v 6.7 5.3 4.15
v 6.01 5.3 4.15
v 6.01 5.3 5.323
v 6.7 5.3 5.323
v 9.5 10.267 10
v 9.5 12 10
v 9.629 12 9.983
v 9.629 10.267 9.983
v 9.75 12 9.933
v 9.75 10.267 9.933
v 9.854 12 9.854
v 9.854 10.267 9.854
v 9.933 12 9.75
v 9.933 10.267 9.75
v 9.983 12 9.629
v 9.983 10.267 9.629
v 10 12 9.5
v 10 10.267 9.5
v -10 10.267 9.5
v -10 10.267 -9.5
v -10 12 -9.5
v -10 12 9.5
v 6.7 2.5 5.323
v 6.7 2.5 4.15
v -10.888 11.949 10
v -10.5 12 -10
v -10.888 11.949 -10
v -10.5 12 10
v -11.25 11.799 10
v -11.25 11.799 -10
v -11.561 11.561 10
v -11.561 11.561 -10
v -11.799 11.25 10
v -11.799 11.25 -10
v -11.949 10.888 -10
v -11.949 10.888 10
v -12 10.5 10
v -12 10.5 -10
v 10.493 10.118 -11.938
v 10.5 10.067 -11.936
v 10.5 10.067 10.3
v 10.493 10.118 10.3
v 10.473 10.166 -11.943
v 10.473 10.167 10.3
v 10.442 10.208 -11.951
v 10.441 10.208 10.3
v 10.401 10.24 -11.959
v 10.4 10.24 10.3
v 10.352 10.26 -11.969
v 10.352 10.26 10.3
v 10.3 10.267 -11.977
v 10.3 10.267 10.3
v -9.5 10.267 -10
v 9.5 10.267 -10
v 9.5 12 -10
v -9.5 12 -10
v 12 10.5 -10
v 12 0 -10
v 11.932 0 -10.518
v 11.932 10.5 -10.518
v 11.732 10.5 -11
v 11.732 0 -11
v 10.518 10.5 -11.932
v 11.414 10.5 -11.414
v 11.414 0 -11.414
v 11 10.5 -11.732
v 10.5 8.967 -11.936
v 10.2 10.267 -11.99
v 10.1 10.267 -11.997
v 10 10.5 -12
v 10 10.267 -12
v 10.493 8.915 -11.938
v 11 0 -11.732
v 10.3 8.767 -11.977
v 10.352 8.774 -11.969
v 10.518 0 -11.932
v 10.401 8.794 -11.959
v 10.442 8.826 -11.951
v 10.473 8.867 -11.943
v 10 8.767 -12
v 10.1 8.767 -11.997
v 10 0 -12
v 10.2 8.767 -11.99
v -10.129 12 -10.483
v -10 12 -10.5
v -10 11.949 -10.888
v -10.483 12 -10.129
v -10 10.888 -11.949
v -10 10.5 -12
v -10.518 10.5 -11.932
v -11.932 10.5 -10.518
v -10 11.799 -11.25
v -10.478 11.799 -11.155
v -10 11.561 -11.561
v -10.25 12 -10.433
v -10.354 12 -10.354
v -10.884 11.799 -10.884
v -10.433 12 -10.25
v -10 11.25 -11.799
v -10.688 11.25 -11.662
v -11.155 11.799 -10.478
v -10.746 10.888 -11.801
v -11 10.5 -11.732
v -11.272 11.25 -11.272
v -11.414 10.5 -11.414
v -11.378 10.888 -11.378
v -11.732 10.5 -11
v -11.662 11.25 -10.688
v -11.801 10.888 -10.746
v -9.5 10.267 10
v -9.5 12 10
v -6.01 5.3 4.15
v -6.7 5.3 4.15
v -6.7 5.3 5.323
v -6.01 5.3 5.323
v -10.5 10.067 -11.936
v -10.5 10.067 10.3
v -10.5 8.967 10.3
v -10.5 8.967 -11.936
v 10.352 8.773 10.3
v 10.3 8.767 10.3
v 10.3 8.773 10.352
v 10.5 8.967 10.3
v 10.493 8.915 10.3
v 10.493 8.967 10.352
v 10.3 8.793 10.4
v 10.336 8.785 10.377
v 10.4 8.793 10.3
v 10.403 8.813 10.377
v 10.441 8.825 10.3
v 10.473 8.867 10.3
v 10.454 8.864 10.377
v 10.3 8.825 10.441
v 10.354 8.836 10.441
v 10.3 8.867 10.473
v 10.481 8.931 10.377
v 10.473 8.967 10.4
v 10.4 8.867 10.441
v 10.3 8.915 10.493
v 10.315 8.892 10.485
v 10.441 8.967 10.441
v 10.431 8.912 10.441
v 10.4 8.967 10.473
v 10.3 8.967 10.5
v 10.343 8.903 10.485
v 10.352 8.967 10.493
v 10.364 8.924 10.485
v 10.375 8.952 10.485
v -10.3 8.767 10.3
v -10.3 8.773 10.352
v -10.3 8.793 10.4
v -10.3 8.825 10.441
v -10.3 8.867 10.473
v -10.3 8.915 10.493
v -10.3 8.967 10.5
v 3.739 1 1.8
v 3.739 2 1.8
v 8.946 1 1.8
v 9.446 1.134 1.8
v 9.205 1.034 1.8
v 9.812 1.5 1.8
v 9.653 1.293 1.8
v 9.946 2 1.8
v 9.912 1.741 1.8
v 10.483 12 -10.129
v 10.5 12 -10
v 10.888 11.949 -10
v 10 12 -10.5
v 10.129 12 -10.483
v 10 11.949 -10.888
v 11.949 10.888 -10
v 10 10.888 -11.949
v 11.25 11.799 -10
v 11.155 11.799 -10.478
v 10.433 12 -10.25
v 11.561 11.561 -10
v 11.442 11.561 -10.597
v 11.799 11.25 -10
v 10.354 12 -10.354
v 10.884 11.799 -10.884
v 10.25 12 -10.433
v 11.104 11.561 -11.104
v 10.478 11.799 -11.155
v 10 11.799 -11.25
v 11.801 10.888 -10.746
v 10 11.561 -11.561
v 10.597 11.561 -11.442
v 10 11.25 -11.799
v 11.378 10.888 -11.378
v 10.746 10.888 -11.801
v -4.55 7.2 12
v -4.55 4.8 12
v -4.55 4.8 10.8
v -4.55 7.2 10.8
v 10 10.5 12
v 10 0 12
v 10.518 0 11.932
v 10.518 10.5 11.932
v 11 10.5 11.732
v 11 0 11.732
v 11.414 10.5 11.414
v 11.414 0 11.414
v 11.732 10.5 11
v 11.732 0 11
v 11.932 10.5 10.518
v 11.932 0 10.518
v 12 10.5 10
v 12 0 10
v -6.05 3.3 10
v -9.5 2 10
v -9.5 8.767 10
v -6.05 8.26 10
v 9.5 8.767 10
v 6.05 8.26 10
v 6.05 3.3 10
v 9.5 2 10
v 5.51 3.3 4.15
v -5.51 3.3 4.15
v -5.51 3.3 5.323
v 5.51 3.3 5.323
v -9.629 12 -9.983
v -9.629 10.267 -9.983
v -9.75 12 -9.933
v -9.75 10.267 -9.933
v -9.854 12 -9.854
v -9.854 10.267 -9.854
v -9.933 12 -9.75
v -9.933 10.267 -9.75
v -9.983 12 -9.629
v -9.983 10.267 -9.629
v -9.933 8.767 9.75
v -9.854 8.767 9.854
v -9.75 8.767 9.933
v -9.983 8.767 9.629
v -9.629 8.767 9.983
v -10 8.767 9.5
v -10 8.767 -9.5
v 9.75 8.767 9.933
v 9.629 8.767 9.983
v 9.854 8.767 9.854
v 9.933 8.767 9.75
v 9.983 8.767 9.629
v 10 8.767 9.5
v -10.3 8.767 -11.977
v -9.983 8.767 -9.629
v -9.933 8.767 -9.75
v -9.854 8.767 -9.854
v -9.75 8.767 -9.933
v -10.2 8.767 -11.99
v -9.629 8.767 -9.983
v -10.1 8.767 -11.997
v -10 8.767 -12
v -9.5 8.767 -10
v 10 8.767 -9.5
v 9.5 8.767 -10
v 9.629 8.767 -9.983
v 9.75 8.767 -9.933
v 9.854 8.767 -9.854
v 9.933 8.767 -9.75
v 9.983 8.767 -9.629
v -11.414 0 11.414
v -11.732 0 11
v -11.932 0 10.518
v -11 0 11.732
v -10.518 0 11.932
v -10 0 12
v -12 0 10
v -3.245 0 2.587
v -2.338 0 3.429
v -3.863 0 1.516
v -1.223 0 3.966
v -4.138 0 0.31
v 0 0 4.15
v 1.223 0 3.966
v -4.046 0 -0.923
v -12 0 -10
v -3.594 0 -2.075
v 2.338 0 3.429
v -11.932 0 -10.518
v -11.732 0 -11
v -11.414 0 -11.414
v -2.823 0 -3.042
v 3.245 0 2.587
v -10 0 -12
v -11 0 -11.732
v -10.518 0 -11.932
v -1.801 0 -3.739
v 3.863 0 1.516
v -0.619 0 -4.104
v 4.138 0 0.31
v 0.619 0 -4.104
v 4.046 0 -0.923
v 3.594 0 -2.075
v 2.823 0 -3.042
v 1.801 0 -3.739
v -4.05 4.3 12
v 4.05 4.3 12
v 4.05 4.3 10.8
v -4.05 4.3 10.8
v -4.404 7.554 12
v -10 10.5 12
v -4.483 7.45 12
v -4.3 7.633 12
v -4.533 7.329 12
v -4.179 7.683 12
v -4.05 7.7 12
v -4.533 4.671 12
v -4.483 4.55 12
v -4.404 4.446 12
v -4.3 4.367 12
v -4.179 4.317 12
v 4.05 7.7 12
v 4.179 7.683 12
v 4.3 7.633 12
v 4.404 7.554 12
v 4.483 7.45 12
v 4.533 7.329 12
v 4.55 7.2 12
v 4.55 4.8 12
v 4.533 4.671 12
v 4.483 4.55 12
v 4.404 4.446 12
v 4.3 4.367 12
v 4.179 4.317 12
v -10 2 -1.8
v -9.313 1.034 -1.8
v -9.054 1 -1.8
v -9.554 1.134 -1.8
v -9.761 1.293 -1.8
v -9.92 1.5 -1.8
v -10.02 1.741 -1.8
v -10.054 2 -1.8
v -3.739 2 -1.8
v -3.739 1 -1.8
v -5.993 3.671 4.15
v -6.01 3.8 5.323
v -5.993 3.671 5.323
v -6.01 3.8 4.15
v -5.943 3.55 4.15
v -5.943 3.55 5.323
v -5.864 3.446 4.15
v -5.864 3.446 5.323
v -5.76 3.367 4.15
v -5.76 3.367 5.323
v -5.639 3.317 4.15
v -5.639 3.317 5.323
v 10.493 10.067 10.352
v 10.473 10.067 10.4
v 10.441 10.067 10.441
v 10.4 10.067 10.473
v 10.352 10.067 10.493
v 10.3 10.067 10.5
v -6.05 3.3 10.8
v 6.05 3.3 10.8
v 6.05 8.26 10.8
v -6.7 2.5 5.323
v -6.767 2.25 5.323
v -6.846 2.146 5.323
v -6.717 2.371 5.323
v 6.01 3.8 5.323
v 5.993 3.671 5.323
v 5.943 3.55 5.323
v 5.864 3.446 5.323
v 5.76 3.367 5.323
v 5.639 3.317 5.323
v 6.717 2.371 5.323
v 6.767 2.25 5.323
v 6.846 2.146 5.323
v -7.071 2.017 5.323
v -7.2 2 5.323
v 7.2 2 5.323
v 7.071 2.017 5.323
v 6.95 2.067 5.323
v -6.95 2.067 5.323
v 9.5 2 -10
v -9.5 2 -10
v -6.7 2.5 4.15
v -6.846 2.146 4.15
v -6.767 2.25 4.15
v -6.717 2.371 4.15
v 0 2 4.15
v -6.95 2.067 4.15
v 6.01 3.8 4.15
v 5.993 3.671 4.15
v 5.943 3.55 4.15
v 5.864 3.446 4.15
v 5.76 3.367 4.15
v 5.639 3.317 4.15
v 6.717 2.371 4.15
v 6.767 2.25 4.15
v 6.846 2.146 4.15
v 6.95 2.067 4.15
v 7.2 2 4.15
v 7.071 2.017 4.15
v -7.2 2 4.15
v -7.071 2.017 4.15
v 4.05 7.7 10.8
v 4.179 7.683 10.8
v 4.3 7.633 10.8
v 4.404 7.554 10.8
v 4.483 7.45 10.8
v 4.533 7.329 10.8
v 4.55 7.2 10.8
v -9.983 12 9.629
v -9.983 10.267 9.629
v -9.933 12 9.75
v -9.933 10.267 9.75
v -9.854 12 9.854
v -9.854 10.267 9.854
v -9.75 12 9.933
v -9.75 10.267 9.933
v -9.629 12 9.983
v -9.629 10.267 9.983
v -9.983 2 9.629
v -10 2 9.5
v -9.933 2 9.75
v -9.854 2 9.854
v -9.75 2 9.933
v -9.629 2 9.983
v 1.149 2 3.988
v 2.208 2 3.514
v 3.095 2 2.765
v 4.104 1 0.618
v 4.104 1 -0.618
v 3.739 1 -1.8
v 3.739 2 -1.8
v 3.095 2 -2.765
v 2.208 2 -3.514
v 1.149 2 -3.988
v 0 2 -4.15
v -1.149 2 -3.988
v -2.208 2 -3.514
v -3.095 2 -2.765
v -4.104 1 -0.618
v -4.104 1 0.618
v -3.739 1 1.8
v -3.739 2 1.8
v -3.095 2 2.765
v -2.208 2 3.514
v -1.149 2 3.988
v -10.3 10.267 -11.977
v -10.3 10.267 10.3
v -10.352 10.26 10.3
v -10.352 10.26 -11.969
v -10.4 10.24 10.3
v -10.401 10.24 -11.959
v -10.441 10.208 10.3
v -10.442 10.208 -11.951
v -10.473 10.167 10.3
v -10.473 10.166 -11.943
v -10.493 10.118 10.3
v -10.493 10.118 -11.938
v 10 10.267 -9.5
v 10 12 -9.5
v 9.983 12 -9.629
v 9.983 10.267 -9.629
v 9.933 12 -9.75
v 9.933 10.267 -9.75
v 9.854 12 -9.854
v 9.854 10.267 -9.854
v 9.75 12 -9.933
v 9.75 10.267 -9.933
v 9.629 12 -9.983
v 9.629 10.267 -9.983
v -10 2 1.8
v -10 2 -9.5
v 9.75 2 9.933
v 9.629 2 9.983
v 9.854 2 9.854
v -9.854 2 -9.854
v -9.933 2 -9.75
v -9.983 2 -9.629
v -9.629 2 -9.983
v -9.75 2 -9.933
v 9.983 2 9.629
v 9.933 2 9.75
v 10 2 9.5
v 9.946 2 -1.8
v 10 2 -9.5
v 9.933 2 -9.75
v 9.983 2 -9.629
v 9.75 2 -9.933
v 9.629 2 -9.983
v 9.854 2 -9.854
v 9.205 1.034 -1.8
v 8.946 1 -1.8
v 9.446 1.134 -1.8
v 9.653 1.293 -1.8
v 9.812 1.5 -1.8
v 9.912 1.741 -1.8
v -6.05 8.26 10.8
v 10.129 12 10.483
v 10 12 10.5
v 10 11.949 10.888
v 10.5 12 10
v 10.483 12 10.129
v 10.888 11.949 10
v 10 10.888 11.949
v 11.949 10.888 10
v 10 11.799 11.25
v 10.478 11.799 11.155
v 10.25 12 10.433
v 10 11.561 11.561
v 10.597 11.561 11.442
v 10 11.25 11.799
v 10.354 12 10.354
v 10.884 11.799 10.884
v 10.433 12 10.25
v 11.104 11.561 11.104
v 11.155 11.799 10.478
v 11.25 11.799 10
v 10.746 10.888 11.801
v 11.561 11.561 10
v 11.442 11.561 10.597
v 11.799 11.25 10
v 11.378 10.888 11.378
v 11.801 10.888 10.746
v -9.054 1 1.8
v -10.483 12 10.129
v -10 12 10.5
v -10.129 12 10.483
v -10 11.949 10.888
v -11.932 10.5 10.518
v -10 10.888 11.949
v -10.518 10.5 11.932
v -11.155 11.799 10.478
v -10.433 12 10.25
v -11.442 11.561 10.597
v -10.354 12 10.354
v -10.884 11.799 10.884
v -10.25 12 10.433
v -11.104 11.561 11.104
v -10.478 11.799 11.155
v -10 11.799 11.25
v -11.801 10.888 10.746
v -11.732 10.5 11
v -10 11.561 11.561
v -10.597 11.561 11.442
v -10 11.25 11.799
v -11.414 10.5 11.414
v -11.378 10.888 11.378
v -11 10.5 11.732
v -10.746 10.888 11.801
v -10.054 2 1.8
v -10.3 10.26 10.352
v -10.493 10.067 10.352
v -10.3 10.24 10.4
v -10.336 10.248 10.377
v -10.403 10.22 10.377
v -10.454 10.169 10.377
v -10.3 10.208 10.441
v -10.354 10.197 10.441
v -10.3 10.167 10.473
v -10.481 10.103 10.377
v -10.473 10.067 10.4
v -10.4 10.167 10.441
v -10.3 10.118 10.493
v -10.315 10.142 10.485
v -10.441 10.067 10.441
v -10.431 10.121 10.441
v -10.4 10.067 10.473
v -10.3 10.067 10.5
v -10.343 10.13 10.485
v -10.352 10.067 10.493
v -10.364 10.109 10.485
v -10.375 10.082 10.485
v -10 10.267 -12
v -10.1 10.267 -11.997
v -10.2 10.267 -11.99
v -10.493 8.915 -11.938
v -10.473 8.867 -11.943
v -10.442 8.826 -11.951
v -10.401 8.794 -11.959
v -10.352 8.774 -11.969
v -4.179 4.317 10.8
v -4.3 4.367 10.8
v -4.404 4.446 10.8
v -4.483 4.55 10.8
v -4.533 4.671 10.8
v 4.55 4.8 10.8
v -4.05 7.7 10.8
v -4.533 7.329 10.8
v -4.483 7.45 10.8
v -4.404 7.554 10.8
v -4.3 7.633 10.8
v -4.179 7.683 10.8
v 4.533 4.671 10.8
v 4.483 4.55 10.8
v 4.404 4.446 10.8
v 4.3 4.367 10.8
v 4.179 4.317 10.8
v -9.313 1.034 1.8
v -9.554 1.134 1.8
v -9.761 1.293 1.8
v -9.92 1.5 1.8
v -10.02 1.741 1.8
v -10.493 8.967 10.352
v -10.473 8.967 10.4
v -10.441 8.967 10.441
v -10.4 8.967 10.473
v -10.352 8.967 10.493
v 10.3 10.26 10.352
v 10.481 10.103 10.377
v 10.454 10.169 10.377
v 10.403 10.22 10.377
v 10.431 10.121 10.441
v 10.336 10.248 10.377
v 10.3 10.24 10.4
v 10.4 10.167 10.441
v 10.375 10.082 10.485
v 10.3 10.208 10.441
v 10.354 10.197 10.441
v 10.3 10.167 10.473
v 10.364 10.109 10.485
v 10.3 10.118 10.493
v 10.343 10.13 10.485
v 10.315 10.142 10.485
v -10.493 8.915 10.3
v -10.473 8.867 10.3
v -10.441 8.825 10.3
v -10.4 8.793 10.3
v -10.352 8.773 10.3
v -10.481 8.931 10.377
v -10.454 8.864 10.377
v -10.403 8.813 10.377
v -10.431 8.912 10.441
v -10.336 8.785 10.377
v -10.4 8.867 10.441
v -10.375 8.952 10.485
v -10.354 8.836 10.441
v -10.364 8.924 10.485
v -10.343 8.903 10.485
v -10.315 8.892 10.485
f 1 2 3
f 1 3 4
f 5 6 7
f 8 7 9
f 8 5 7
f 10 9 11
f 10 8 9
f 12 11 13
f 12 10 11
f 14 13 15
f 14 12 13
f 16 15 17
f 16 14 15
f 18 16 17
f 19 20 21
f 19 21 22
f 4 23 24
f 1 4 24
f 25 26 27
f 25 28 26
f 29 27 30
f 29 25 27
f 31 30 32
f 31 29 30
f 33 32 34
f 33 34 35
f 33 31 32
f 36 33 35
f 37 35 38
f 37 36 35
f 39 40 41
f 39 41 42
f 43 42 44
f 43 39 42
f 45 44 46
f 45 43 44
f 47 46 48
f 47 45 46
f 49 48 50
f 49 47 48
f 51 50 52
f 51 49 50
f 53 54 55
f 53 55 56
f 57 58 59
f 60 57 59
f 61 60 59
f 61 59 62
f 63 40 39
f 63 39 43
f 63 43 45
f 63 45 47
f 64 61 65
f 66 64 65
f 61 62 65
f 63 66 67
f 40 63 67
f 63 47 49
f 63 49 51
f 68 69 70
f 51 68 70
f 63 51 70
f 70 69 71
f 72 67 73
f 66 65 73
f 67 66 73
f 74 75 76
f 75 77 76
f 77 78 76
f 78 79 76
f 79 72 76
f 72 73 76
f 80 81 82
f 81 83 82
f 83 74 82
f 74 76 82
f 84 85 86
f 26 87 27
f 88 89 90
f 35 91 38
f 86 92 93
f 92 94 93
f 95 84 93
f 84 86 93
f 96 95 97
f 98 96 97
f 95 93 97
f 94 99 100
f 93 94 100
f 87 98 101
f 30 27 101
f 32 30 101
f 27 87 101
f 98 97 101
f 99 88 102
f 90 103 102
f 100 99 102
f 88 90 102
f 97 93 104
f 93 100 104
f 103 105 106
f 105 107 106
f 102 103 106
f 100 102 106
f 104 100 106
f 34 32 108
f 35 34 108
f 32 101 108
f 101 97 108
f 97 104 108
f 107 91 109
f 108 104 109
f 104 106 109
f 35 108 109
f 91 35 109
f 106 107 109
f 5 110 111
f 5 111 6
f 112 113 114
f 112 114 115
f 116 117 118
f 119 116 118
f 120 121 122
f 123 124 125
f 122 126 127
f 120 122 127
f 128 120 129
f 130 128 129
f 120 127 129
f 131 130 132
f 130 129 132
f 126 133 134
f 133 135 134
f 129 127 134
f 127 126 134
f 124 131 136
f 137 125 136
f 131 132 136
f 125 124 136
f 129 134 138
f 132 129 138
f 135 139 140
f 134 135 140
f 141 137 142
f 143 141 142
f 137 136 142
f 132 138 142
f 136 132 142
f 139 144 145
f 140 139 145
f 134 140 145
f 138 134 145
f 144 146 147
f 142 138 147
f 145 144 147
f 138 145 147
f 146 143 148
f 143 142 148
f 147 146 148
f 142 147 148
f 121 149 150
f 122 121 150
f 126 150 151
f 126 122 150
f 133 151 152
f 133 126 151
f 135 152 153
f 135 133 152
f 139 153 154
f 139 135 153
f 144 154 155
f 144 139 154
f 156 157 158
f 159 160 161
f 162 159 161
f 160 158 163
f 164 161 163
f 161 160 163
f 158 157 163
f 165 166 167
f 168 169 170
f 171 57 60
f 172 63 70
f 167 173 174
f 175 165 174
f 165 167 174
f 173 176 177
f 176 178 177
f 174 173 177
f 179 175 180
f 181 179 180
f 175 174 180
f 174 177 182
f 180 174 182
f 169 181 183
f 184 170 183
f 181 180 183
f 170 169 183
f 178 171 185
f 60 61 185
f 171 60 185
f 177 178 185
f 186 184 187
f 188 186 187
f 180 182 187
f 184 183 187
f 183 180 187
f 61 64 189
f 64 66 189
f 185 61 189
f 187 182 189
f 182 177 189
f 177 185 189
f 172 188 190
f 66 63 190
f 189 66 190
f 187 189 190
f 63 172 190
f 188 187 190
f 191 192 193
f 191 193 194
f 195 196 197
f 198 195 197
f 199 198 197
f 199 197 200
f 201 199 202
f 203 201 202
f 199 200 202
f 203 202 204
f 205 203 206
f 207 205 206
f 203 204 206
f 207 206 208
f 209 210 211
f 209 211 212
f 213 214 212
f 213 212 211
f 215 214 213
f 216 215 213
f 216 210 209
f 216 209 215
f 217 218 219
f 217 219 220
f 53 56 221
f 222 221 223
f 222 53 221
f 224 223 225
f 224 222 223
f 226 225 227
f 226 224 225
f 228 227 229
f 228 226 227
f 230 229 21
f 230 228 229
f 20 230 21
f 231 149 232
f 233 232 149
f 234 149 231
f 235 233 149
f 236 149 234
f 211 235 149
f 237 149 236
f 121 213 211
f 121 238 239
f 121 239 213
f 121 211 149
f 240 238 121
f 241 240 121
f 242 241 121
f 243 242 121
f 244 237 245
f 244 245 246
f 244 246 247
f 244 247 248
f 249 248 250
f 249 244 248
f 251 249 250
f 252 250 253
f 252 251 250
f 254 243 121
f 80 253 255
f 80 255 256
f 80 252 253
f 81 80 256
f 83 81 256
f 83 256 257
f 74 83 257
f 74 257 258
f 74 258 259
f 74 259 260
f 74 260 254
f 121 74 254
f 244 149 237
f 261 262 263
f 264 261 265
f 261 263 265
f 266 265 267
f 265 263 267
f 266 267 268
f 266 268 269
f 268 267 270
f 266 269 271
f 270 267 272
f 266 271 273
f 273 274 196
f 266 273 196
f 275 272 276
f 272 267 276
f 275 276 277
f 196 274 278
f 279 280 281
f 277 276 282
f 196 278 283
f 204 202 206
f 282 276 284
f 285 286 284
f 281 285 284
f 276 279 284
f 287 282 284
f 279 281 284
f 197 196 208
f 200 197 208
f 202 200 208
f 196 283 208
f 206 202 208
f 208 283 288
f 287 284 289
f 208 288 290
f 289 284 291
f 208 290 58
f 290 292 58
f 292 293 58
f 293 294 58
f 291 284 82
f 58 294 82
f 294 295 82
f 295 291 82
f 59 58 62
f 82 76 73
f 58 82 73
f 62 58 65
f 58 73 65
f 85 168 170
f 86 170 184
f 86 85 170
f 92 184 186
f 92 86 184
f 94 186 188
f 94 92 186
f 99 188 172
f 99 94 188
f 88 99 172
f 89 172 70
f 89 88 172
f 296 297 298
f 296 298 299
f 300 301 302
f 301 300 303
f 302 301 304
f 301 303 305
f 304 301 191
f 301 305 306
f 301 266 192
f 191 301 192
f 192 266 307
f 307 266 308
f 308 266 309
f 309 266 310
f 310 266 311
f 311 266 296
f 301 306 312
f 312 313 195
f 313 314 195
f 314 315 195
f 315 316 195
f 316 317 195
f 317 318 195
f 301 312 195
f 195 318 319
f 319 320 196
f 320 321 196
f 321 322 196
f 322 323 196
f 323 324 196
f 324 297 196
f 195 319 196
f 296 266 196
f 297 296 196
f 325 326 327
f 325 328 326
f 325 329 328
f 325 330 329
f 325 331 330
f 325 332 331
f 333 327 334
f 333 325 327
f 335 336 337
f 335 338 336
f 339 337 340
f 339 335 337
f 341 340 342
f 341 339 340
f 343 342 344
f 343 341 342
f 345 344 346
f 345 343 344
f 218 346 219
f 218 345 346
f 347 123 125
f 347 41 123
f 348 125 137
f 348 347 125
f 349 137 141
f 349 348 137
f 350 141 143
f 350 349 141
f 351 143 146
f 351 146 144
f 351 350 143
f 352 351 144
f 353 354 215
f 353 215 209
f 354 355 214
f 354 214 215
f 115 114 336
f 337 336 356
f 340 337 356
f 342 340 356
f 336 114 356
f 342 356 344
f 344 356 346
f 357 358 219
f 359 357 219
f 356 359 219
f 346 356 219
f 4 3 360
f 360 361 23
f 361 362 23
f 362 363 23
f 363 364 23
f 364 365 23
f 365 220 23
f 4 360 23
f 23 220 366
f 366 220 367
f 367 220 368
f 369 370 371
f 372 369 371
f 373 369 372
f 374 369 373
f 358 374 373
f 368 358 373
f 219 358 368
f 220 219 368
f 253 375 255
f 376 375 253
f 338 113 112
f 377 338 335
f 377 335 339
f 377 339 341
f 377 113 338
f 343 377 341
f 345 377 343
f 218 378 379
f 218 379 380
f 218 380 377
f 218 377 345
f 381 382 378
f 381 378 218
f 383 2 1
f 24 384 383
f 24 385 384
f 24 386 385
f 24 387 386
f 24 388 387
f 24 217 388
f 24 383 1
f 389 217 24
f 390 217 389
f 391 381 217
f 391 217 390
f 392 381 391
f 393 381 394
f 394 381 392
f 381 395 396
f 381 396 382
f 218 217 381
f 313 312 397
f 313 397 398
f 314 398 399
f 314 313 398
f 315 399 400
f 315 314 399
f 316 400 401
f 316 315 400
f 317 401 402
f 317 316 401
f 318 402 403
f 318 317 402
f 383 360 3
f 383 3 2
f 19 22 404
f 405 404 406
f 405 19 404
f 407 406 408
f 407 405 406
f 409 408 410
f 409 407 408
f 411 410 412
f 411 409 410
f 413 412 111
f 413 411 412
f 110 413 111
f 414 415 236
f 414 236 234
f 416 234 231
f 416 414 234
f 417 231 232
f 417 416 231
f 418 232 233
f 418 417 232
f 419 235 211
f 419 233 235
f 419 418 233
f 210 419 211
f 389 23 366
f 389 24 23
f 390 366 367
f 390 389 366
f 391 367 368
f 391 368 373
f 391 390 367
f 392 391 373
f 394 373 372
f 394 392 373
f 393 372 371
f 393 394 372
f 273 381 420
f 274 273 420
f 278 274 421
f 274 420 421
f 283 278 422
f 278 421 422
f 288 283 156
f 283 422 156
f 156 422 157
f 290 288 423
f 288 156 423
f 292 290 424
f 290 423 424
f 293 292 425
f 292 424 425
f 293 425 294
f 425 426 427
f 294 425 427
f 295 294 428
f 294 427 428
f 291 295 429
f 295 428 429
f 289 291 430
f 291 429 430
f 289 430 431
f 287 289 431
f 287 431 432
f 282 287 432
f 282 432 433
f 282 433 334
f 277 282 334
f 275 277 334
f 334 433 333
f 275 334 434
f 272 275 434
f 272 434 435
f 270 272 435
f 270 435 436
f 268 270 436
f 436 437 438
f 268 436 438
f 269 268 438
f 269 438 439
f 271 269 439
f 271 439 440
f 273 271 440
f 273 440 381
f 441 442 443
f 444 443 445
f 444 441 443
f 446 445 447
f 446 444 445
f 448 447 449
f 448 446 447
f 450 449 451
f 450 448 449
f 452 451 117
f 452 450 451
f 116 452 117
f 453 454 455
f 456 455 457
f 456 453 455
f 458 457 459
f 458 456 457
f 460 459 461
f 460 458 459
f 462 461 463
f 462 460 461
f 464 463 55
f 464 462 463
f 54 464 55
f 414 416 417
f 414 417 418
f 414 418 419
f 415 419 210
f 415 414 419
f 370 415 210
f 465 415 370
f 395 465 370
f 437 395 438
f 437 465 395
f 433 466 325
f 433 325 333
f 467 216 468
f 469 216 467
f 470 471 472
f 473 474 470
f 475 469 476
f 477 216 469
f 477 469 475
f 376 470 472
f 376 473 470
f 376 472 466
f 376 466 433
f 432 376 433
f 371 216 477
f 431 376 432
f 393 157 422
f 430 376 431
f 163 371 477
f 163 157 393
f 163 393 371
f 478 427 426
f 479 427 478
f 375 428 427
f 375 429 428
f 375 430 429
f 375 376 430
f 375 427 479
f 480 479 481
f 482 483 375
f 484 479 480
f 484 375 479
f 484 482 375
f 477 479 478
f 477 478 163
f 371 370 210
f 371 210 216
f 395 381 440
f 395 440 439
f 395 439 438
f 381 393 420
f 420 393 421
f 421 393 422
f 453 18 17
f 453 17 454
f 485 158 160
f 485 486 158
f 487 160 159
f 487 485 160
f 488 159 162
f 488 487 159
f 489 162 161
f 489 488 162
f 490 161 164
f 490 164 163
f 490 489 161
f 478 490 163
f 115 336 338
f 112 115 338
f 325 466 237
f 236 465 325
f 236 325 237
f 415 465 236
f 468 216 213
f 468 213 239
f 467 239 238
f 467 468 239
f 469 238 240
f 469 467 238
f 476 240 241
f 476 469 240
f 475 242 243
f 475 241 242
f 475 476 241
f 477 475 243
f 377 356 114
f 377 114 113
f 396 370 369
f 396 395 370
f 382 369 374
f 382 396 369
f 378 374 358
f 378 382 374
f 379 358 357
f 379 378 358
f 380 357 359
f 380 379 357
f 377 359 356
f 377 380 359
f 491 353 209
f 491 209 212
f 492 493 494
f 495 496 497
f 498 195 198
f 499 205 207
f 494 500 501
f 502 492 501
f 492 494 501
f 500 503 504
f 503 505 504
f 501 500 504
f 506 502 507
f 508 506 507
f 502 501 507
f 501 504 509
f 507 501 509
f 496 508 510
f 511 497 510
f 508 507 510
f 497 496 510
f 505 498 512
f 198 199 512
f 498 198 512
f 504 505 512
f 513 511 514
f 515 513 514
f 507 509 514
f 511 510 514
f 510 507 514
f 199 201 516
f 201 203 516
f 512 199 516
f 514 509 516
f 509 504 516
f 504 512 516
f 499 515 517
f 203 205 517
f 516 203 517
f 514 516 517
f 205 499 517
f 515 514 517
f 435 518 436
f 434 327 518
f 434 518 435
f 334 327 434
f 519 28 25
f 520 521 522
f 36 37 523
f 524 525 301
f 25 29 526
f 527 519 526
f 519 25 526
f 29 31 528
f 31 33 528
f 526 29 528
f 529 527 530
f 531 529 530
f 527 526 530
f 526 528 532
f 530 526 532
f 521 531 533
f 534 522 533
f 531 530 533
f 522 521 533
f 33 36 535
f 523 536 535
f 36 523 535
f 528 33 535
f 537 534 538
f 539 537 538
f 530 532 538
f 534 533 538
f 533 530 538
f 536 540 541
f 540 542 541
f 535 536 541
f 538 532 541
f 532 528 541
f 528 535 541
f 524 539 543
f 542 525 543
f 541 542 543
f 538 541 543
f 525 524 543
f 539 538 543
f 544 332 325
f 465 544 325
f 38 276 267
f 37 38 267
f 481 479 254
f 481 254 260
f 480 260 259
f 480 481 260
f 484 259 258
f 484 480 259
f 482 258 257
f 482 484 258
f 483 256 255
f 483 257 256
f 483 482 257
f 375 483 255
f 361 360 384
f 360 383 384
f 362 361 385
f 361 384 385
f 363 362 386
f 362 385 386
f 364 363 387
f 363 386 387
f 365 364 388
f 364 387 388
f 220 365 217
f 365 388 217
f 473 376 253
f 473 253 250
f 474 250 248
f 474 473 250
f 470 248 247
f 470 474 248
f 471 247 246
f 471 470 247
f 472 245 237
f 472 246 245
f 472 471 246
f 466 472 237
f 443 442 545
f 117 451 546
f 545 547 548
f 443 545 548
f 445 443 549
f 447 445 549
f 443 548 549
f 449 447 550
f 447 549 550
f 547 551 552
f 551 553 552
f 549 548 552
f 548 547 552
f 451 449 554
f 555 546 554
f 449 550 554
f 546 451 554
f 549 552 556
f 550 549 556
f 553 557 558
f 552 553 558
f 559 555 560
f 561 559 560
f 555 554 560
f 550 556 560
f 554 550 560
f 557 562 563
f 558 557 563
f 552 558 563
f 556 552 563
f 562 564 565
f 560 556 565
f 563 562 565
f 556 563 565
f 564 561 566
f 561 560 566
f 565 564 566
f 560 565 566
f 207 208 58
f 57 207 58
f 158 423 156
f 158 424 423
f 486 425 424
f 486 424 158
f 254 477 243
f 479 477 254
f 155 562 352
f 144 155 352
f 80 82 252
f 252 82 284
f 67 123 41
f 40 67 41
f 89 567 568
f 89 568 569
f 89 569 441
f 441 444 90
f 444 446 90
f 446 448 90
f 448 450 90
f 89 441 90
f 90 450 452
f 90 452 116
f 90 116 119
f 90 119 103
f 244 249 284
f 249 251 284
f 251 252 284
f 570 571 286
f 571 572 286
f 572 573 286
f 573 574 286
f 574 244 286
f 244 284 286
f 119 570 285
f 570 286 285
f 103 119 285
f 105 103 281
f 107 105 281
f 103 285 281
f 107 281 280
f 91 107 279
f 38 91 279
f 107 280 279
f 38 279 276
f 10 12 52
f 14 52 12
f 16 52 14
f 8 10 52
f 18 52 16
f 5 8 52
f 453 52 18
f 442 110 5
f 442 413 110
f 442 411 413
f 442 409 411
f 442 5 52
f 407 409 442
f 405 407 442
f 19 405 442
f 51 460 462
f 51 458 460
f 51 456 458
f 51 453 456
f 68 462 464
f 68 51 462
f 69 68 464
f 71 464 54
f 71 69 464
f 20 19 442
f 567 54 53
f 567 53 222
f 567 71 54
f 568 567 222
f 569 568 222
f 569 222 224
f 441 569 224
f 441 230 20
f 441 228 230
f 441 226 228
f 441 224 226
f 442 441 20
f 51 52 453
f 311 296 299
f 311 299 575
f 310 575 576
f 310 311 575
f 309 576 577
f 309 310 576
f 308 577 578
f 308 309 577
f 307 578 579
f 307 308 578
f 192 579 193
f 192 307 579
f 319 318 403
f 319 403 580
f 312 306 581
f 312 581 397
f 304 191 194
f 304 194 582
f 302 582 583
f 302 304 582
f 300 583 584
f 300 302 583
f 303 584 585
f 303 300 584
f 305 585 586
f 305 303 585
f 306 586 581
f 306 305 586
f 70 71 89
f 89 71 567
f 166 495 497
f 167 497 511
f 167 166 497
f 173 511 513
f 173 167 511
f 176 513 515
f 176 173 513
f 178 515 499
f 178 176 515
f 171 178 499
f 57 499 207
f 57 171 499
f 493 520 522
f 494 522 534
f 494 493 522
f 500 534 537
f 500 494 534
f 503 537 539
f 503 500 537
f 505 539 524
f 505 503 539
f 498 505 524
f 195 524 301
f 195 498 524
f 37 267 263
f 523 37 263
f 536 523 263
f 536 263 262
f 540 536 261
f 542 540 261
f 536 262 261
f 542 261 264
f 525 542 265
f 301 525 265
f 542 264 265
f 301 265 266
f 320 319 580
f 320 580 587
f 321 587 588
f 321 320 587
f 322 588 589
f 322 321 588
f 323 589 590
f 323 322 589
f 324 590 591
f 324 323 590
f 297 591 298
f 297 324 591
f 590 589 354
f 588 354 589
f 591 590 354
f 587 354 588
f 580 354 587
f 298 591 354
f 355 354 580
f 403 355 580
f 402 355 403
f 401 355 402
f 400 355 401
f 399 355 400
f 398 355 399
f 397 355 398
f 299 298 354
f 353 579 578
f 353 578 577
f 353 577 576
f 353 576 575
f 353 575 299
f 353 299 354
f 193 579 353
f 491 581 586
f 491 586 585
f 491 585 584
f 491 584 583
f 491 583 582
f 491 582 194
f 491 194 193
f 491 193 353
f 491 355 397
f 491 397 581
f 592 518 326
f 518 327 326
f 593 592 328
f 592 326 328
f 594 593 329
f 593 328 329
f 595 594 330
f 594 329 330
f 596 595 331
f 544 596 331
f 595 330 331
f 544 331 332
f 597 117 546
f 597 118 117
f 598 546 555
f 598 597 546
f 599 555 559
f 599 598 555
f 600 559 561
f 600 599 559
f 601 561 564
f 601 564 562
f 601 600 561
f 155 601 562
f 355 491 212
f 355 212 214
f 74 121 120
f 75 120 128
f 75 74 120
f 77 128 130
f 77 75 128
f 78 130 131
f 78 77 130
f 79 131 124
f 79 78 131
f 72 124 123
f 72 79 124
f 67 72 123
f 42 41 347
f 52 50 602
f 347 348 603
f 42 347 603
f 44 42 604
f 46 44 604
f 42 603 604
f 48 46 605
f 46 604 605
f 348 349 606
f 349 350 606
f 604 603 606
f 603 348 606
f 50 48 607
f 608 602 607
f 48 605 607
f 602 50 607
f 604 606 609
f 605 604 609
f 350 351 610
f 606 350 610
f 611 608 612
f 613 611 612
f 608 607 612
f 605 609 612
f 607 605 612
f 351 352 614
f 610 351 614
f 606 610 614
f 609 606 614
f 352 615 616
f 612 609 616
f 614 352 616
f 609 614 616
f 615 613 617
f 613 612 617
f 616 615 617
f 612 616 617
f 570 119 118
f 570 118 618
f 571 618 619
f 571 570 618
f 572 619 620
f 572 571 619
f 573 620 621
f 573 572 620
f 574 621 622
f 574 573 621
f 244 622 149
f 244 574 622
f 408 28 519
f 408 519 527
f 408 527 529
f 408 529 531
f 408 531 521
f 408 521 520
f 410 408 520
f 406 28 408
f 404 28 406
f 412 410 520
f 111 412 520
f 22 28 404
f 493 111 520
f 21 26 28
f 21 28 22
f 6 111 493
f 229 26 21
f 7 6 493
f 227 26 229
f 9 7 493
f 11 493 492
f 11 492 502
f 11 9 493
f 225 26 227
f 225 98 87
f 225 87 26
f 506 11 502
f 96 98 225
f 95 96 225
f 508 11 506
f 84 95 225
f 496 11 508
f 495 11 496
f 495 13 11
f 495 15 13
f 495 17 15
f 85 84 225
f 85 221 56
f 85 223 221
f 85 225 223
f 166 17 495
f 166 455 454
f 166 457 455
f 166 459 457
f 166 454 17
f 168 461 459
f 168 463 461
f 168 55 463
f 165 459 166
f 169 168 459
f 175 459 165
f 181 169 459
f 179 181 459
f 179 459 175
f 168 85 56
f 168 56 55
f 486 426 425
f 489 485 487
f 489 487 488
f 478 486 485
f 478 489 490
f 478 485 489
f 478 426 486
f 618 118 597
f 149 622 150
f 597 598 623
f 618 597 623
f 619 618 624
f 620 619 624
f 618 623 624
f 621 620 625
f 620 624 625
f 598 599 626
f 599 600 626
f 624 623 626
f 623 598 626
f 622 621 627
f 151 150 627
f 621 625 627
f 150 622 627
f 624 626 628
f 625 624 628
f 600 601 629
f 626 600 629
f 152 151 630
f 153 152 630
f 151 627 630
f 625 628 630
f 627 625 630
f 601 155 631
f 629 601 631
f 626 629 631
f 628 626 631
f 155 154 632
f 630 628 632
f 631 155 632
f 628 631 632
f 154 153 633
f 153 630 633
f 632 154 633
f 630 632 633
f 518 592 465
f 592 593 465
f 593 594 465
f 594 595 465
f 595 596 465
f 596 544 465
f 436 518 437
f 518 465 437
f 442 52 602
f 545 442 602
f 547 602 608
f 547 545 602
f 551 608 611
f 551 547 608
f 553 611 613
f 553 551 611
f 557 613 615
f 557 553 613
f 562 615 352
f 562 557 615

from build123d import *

# Parameters (mm, degrees)
BOSS_EXTRUDE2_DEPTH = 2
BOSS_EXTRUDE3_DEPTH = 10
CUT_EXTRUDE1_REACH  = 31.394
CUT_EXTRUDE2_REACH  = 21.698
SKETCH5_R           = 4.15
SKETCH6_W           = 20
SKETCH6_H           = 3.6
CUT_EXTRUDE3_DEPTH  = 1
FILLET1_R           = 1
CUT_EXTRUDE4_START  = -0.8
CUT_EXTRUDE4_DEPTH  = 0.8
SKETCH8_W           = 13.4
SKETCH8_H           = 1.173218526
BOSS_EXTRUDE4_DEPTH = 1.3
SKETCH10_W          = 0.69
SKETCH10_H          = 1.173218526
BOSS_EXTRUDE5_DEPTH = 2
FILLET2_R           = 0.5
FILLET6_R           = 0.5
FILLET8_R           = 1.5
CUT_EXTRUDE6_DEPTH  = 22.5
FILLET9_R           = 0.2


with BuildPart() as part:
    # Sketch2 → Boss-Extrude2 (new body)
    with BuildSketch(Plane(origin=(0, 0, 0), x_dir=(1, 0, 0), z_dir=(0, 1, 0))):
        with BuildLine():
            Line((-10, -12), (10, -12))
            ThreePointArc((10, -12), (11.414213562, -11.414213562), (12, -10))
            Line((12, -10), (12, 10))
            ThreePointArc((12, 10), (11.414213562, 11.414213562), (10, 12))
            Line((10, 12), (-10, 12))
            ThreePointArc((-10, 12), (-11.414213562, 11.414213562), (-12, 10))
            Line((-12, 10), (-12, -10))
            ThreePointArc((-12, -10), (-11.414213562, -11.414213562), (-10, -12))
        make_face()
    extrude(amount=BOSS_EXTRUDE2_DEPTH)

    # Sketch3 → Boss-Extrude3 (add)
    with BuildSketch(Plane(origin=(0, 2, 0), x_dir=(1, 0, 0), z_dir=(0, 1, 0))):
        with BuildLine():
            Line((-10, -12), (10, -12))
            ThreePointArc((10, -12), (11.414213562, -11.414213562), (12, -10))
            Line((12, -10), (12, 10))
            ThreePointArc((12, 10), (11.414213562, 11.414213562), (10, 12))
            Line((10, 12), (-10, 12))
            ThreePointArc((-10, 12), (-11.414213562, 11.414213562), (-12, 10))
            Line((-12, 10), (-12, -10))
            ThreePointArc((-12, -10), (-11.414213562, -11.414213562), (-10, -12))
        make_face()
        with BuildLine():
            Line((-9.5, -10), (9.5, -10))
            ThreePointArc((9.5, -10), (9.853553391, -9.853553391), (10, -9.5))
            Line((10, -9.5), (10, 9.5))
            ThreePointArc((10, 9.5), (9.853553391, 9.853553391), (9.5, 10))
            Line((9.5, 10), (-9.5, 10))
            ThreePointArc((-9.5, 10), (-9.853553391, 9.853553391), (-10, 9.5))
            Line((-10, 9.5), (-10, -9.5))
            ThreePointArc((-10, -9.5), (-9.853553391, -9.853553391), (-9.5, -10))
        make_face(mode=Mode.SUBTRACT)
    extrude(amount=BOSS_EXTRUDE3_DEPTH)

    # Sketch4 → Cut-Extrude1 (cut, up to next)
    with BuildSketch(Plane.XY.offset(12), mode=Mode.PRIVATE) as cut_extrude1_sk1:
        with BuildLine():
            Line((-4.05, 7.7), (4.05, 7.7))
            ThreePointArc((4.05, 7.7), (4.403553391, 7.553553391), (4.55, 7.2))
            Line((4.55, 7.2), (4.55, 4.8))
            ThreePointArc((4.55, 4.8), (4.403553391, 4.446446609), (4.05, 4.3))
            Line((4.05, 4.3), (-4.05, 4.3))
            ThreePointArc((-4.05, 4.3), (-4.403553391, 4.446446609), (-4.55, 4.8))
            Line((-4.55, 4.8), (-4.55, 7.2))
            ThreePointArc((-4.55, 7.2), (-4.403553391, 7.553553391), (-4.05, 7.7))
        make_face()
    cut_extrude1_tool1 = extrude(cut_extrude1_sk1.sketch, amount=-CUT_EXTRUDE1_REACH, mode=Mode.PRIVATE) & part.part
    add(cut_extrude1_tool1.solids().sort_by_distance((0, 6, 12))[0], mode=Mode.SUBTRACT)

    # Sketch5 → Cut-Extrude2 (cut, up to next)
    with BuildSketch(Plane(origin=(0, 2, 0), x_dir=(1, 0, 0), z_dir=(0, 1, 0)), mode=Mode.PRIVATE) as cut_extrude2_sk1:
        with Locations(Location((0, 0, 0), (0, 0, 270))):
            Circle(SKETCH5_R)
    cut_extrude2_tool1 = extrude(cut_extrude2_sk1.sketch, amount=-CUT_EXTRUDE2_REACH, mode=Mode.PRIVATE) & part.part
    add(cut_extrude2_tool1.solids().sort_by_distance((0, 2, 0))[0], mode=Mode.SUBTRACT)

    # Sketch6 → Cut-Extrude3 (cut)
    with BuildSketch(Plane(origin=(0, 2, 0), x_dir=(1, 0, 0), z_dir=(0, 1, 0))):
        with Locations((-0.054263112, 0)):
            Rectangle(SKETCH6_W, SKETCH6_H)
    extrude(amount=-CUT_EXTRUDE3_DEPTH, mode=Mode.SUBTRACT)

    # Fillet1
    fillet1_edges = [part.edges().sort_by_distance(p)[0] for p in [
        (9.945736888, 1, 0),
        (-10.054263112, 1, 0),
    ]]
    fillet(fillet1_edges, radius=FILLET1_R - 0.0001)  # a hair under: the kernel refuses the full size

    # Sketch7 → Cut-Extrude4 (cut)
    with BuildSketch(Plane(origin=(0, 0, 10), x_dir=(-1, 0, 0), z_dir=(0, 0, -1)).offset(CUT_EXTRUDE4_START)):
        with BuildLine():
            Line((-6.05, 8.26), (-6.05, 4.3))
            Line((-6.05, 4.3), (-4.05, 4.3))
            ThreePointArc((-4.05, 4.3), (-4.403553391, 4.446446609), (-4.55, 4.8))
            Line((-4.55, 4.8), (-4.55, 7.2))
            ThreePointArc((-4.55, 7.2), (-4.403553391, 7.553553391), (-4.05, 7.7))
            Line((-4.05, 7.7), (4.05, 7.7))
            ThreePointArc((4.05, 7.7), (4.403553391, 7.553553391), (4.55, 7.2))
            Line((4.55, 7.2), (4.55, 4.8))
            ThreePointArc((4.55, 4.8), (4.403553391, 4.446446609), (4.05, 4.3))
            Line((4.05, 4.3), (6.05, 4.3))
            Line((6.05, 4.3), (6.05, 8.26))
            Line((6.05, 8.26), (-6.05, 8.26))
        make_face()
        Polygon((-6.05, 4.3), (-6.05, 3.3), (6.05, 3.3), (6.05, 4.3), (4.05, 4.3), (-4.05, 4.3), align=None)
    extrude(amount=CUT_EXTRUDE4_DEPTH, mode=Mode.SUBTRACT)

    # Sketch8 → Boss-Extrude4 (add)
    with BuildSketch(Plane(origin=(0, 2, 0), x_dir=(1, 0, 0), z_dir=(0, 1, 0))):
        with Locations((0, -4.736609263)):
            Rectangle(SKETCH8_W, SKETCH8_H)
    extrude(amount=BOSS_EXTRUDE4_DEPTH)

    # Sketch10 → Boss-Extrude5 (add)
    with BuildSketch(Plane(origin=(0, 3.3, 0), x_dir=(1, 0, 0), z_dir=(0, 1, 0))):
        with Locations((6.355, -4.736609263)):
            Rectangle(SKETCH10_W, SKETCH10_H)
        with Locations((-6.355, -4.736609263)):
            Rectangle(SKETCH10_W, SKETCH10_H)
    extrude(amount=BOSS_EXTRUDE5_DEPTH)

    # Fillet2
    fillet2_edges = [part.edges().sort_by_distance(p)[0] for p in [
        (-6.01, 3.3, 4.736609263),
        (6.01, 3.3, 4.736609263),
    ]]
    fillet(fillet2_edges, radius=FILLET2_R)

    # Fillet6
    fillet6_edges = [part.edges().sort_by_distance(p)[0] for p in [
        (6.7, 2, 4.736609263),
        (-6.7, 2, 4.736609263),
    ]]
    fillet(fillet6_edges, radius=FILLET6_R)

    # Fillet8
    fillet8_edges = [part.edges().sort_by_distance(p)[0] for p in [
        (-12, 12, 0),
        (-11.414213562, 12, 11.414213562),
        (11.414213562, 12, -11.414213562),
        (0, 12, -12),
        (-11.414213562, 12, -11.414213562),
        (0, 12, 12),
        (11.414213562, 12, 11.414213562),
        (12, 12, 0),
    ]]
    fillet(fillet8_edges, radius=FILLET8_R)

    # Sketch21 → Cut-Extrude6 (cut)
    with BuildSketch(Plane(origin=(0, 0, -12), x_dir=(-1, 0, 0), z_dir=(0, 0, -1))):
        with BuildLine():
            Line((-10.3, 10.26661549), (10.3, 10.26661549))
            ThreePointArc((10.3, 10.26661549), (10.441421356, 10.208036847), (10.5, 10.06661549))
            Line((10.5, 10.06661549), (10.5, 8.96661549))
            ThreePointArc((10.5, 8.96661549), (10.441421356, 8.825194134), (10.3, 8.76661549))
            Line((10.3, 8.76661549), (-10.3, 8.76661549))
            ThreePointArc((-10.3, 8.76661549), (-10.441421356, 8.825194134), (-10.5, 8.96661549))
            Line((-10.5, 8.96661549), (-10.5, 10.06661549))
            ThreePointArc((-10.5, 10.06661549), (-10.441421356, 10.208036847), (-10.3, 10.26661549))
        make_face()
    extrude(amount=-CUT_EXTRUDE6_DEPTH, mode=Mode.SUBTRACT)

    # Fillet9
    fillet9_edges = [part.edges().sort_by_distance(p)[0] for p in [
        (10.441421356, 8.825194134, 10.5),
        (10.5, 9.51661549, 10.5),
        (10.441421356, 10.208036847, 10.5),
        (-10.441421356, 8.825194134, 10.5),
        (-10.441421356, 10.208036847, 10.5),
        (-10.5, 9.51661549, 10.5),
        (0, 8.76661549, 10.5),
        (0, 10.26661549, 10.5),
    ]]
    fillet(fillet9_edges, radius=FILLET9_R)


solid = part.part
